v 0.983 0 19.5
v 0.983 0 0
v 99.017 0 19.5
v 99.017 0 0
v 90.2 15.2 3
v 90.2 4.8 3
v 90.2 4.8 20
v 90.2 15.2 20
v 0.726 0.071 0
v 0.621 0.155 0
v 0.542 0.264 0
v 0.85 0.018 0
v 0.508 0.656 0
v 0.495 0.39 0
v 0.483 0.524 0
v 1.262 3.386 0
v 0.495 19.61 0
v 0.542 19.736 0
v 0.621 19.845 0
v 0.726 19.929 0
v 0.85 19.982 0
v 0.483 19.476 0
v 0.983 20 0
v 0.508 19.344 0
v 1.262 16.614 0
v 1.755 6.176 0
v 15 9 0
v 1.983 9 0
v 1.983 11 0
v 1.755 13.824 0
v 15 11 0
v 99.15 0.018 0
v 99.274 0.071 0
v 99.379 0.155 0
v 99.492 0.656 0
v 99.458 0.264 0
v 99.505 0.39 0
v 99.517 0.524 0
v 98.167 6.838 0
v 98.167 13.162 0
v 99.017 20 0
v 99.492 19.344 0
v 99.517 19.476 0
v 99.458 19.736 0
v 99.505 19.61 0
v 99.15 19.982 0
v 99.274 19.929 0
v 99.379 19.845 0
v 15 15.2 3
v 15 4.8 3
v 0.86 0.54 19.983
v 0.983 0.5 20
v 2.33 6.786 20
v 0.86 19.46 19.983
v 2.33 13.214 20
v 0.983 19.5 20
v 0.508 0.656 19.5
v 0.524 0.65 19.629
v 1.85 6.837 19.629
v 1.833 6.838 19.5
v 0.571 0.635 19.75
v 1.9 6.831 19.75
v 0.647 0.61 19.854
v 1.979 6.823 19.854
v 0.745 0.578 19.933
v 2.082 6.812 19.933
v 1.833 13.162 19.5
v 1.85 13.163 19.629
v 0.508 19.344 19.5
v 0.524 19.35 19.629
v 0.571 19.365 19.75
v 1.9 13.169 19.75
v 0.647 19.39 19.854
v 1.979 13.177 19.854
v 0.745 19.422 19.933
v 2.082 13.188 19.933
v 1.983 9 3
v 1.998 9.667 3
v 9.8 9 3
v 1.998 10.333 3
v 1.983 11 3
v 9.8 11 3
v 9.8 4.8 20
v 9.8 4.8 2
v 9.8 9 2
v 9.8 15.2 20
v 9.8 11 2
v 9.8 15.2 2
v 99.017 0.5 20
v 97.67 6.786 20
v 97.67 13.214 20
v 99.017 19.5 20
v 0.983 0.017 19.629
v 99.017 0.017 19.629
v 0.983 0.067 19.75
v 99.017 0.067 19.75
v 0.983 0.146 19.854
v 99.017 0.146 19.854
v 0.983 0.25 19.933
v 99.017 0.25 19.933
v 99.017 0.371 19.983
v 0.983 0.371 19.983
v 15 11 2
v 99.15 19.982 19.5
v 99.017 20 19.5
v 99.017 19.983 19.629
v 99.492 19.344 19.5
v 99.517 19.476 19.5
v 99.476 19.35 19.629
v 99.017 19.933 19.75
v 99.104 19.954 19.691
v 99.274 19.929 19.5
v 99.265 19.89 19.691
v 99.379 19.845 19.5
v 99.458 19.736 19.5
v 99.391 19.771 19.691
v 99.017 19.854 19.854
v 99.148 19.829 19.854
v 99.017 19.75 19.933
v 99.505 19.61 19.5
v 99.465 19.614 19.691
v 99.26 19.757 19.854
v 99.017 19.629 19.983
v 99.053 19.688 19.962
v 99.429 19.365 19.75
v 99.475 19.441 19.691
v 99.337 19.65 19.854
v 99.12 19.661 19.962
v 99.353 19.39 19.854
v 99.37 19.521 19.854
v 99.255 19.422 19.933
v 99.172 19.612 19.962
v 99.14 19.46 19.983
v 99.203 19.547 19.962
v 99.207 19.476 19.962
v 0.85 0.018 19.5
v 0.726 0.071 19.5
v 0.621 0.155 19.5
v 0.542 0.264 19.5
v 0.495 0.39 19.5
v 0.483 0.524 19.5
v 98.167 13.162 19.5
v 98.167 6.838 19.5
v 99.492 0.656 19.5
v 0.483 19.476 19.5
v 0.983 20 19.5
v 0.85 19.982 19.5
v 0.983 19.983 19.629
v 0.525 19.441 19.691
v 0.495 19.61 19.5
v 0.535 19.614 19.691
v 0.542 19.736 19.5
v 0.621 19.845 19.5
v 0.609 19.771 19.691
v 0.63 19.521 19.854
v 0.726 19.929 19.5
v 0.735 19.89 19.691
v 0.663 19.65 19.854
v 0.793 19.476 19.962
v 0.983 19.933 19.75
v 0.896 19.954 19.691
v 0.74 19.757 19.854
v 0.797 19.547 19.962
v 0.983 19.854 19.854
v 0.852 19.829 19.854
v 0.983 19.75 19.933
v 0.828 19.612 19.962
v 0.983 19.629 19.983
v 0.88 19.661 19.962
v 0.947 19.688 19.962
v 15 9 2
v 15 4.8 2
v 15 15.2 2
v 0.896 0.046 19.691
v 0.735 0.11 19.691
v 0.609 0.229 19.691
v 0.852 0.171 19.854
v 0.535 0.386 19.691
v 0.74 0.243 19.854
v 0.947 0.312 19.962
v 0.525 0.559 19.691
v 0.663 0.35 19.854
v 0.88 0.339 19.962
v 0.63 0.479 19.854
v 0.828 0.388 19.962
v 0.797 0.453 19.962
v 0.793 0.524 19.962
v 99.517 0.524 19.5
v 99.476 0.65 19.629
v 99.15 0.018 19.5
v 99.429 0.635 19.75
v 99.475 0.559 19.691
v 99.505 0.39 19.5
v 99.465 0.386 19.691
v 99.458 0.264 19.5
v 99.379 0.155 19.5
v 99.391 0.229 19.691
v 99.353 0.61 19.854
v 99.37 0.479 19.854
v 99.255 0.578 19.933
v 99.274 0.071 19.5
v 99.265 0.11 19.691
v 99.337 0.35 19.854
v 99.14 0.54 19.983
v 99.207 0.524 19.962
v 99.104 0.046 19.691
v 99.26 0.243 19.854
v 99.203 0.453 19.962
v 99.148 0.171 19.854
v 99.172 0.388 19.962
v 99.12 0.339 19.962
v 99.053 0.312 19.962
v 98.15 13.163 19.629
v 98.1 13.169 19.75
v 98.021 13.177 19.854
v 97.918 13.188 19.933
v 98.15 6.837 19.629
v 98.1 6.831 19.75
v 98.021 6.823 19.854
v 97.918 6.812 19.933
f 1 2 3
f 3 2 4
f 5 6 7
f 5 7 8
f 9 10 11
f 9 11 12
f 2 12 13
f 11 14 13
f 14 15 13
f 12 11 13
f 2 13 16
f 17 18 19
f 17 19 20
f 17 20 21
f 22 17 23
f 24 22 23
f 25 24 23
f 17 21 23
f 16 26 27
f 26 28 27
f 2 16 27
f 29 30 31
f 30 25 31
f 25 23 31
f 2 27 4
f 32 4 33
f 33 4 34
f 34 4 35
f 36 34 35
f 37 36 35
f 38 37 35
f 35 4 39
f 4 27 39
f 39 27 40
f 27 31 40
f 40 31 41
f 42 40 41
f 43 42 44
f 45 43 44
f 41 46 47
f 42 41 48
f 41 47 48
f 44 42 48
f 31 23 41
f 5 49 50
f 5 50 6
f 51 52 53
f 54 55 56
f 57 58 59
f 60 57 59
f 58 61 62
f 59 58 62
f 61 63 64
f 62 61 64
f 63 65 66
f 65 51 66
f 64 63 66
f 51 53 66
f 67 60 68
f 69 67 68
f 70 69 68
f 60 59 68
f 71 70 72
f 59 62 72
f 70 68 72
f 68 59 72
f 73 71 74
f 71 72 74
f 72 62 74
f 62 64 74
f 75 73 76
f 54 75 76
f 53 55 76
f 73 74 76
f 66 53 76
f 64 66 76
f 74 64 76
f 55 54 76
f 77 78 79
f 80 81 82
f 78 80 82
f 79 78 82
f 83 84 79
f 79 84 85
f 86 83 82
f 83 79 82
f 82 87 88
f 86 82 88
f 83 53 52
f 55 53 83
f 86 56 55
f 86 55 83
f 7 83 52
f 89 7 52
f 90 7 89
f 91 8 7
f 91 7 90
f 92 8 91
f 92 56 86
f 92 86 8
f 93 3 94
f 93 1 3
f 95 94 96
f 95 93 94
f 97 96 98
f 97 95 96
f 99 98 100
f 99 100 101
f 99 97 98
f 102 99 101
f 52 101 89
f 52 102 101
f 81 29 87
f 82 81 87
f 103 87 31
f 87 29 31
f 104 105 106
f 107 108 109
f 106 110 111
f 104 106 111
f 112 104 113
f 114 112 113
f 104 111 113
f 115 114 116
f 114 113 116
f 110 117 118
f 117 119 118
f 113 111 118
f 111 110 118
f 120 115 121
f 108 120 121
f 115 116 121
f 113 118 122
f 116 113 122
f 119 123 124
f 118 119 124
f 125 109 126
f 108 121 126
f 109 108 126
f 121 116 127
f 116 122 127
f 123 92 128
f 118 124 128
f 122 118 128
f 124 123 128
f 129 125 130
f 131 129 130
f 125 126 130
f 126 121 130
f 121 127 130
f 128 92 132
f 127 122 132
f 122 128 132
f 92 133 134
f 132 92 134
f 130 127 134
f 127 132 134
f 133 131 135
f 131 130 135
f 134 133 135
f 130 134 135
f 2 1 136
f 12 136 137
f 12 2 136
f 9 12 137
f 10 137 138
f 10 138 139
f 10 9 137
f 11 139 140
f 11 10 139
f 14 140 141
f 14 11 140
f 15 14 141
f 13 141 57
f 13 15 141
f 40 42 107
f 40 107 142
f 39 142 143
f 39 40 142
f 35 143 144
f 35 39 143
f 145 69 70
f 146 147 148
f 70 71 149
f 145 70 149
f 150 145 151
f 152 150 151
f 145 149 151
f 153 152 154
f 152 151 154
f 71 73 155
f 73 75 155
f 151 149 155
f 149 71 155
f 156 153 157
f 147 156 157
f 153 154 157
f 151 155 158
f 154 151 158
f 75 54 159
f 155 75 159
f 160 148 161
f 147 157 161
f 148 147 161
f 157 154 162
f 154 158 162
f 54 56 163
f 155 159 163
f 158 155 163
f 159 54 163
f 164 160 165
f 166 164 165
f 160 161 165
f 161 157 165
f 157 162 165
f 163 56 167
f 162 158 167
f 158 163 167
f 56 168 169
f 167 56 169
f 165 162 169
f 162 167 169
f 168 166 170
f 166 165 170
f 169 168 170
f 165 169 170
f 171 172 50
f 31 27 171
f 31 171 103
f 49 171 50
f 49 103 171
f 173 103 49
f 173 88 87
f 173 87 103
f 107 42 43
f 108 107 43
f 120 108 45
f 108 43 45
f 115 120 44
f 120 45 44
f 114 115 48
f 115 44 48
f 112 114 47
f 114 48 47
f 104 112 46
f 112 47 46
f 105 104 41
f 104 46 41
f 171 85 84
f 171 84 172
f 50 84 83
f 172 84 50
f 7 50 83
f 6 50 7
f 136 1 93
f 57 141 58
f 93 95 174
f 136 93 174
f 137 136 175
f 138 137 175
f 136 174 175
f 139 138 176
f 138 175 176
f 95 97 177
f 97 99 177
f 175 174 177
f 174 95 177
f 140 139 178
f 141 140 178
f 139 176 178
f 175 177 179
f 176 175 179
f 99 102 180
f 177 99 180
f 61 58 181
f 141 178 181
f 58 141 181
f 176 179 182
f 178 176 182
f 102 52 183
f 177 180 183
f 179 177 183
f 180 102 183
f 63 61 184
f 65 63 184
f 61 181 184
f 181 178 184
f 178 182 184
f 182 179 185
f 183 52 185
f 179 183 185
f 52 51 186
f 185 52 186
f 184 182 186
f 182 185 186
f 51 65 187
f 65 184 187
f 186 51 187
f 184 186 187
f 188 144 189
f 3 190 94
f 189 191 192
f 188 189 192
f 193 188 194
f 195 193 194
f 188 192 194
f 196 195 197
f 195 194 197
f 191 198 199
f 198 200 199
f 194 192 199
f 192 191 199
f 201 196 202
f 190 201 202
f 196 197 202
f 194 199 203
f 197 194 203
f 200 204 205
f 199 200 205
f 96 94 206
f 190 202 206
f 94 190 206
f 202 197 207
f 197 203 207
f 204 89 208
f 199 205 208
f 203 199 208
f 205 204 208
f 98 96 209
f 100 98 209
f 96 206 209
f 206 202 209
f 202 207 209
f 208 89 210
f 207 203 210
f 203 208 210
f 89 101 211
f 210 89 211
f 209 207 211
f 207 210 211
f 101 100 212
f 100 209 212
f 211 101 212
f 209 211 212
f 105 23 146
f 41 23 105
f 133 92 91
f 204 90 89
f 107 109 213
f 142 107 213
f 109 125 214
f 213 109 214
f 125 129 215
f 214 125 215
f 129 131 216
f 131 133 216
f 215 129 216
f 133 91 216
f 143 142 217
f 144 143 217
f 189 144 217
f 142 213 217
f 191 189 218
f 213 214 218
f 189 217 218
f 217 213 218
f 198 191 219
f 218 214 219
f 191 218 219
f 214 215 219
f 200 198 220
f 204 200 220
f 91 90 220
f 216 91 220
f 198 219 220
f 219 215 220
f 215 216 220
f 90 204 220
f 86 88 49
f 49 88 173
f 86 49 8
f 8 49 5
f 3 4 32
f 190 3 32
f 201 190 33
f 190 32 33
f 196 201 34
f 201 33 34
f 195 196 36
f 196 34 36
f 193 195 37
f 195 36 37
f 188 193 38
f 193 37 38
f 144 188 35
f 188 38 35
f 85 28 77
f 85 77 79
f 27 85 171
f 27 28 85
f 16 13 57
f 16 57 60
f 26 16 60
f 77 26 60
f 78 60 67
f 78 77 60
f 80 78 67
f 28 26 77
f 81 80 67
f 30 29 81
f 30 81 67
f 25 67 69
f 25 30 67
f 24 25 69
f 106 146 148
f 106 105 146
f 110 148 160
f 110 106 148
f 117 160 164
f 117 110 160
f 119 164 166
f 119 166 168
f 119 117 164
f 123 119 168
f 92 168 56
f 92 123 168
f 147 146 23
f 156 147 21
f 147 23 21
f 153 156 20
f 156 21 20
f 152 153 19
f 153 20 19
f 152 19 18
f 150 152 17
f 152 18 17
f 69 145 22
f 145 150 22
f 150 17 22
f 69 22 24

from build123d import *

# Parameters (mm, degrees)
CYLINDER_R        = 30
CYLINDER_DEPTH    = 20
CYLINDER001_R     = 30
CYLINDER001_DEPTH = 20
BOX003_W          = 5.2
BOX003_H          = 10.4
BOX003_DEPTH      = 1
BOX002_W          = 15
BOX002_H          = 2
BOX002_DEPTH      = 3
BOX001_W          = 80.4
BOX001_H          = 10.4
BOX001_DEPTH      = 20
BOX_W             = 100
BOX_H             = 20
BOX_DEPTH         = 20
FILLET_R          = 0.5
FILLET001_R       = 0.5


with BuildPart() as cylinder:
    # Cylinder → Cylinder (new body)
    with BuildSketch(Plane(origin=(-28, 10, 0), x_dir=(1, 0, 0), z_dir=(0, 0, 1))):
        Circle(CYLINDER_R)
    extrude(amount=CYLINDER_DEPTH)


with BuildPart() as cylinder001:
    # Cylinder001 → Cylinder001 (new body)
    with BuildSketch(Plane(origin=(128, 10, 0), x_dir=(1, 0, 0), z_dir=(0, 0, 1))):
        Circle(CYLINDER001_R)
    extrude(amount=CYLINDER001_DEPTH)


with BuildPart() as cube003:
    # Box003 → Box003 (new body)
    with BuildSketch(Plane(origin=(9.8, 4.8, 2), x_dir=(1, 0, 0), z_dir=(0, 0, 1))):
        with Locations((2.6, 5.2)):
            Rectangle(BOX003_W, BOX003_H)
    extrude(amount=BOX003_DEPTH)


with BuildPart() as cube002:
    # Box002 → Box002 (new body)
    with BuildSketch(Plane(origin=(0, 9, 0), x_dir=(1, 0, 0), z_dir=(0, 0, 1))):
        with Locations((7.5, 1)):
            Rectangle(BOX002_W, BOX002_H)
    extrude(amount=BOX002_DEPTH)


with BuildPart() as cube001:
    # Box001 → Box001 (new body)
    with BuildSketch(Plane(origin=(9.8, 4.8, 3), x_dir=(1, 0, 0), z_dir=(0, 0, 1))):
        with Locations((40.2, 5.2)):
            Rectangle(BOX001_W, BOX001_H)
    extrude(amount=BOX001_DEPTH)


with BuildPart() as fillet001:
    # Box → Box (new body)
    with BuildSketch(Plane.XY):
        with Locations((50, 10)):
            Rectangle(BOX_W, BOX_H)
    extrude(amount=BOX_DEPTH)

    # Cut: cut Cube001
    add(cube001.part, mode=Mode.SUBTRACT)

    # Cut001: cut Cube002
    add(cube002.part, mode=Mode.SUBTRACT)

    # Cut002: cut Cube003
    add(cube003.part, mode=Mode.SUBTRACT)

    # Cut003: cut Cylinder001
    add(cylinder001.part, mode=Mode.SUBTRACT)

    # Cut004: cut Cylinder
    add(cylinder.part, mode=Mode.SUBTRACT)

    # Fillet
    fillet_edges = [fillet001.edges().sort_by_distance(p)[0] for p in [
        (99.715729, 20, 10),
        (0.284271, 20, 10),
        (99.715729, 0, 10),
        (0.284271, 0, 10),
    ]]
    fillet(fillet_edges, radius=FILLET_R)

    # Fillet001
    fillet001_edges = [fillet001.edges().sort_by_distance(p)[0] for p in [
        (50, 20, 20),
        (0.577865, 19.793369, 20),
        (99.422135, 19.793369, 20),
        (1.624557, 14.731343, 20),
        (98, 10, 20),
        (1.624557, 5.268657, 20),
        (99.422135, 0.206631, 20),
        (0.577865, 0.206631, 20),
        (50, 0, 20),
    ]]
    fillet(fillet001_edges, radius=FILLET001_R)


solid = fillet001.part
